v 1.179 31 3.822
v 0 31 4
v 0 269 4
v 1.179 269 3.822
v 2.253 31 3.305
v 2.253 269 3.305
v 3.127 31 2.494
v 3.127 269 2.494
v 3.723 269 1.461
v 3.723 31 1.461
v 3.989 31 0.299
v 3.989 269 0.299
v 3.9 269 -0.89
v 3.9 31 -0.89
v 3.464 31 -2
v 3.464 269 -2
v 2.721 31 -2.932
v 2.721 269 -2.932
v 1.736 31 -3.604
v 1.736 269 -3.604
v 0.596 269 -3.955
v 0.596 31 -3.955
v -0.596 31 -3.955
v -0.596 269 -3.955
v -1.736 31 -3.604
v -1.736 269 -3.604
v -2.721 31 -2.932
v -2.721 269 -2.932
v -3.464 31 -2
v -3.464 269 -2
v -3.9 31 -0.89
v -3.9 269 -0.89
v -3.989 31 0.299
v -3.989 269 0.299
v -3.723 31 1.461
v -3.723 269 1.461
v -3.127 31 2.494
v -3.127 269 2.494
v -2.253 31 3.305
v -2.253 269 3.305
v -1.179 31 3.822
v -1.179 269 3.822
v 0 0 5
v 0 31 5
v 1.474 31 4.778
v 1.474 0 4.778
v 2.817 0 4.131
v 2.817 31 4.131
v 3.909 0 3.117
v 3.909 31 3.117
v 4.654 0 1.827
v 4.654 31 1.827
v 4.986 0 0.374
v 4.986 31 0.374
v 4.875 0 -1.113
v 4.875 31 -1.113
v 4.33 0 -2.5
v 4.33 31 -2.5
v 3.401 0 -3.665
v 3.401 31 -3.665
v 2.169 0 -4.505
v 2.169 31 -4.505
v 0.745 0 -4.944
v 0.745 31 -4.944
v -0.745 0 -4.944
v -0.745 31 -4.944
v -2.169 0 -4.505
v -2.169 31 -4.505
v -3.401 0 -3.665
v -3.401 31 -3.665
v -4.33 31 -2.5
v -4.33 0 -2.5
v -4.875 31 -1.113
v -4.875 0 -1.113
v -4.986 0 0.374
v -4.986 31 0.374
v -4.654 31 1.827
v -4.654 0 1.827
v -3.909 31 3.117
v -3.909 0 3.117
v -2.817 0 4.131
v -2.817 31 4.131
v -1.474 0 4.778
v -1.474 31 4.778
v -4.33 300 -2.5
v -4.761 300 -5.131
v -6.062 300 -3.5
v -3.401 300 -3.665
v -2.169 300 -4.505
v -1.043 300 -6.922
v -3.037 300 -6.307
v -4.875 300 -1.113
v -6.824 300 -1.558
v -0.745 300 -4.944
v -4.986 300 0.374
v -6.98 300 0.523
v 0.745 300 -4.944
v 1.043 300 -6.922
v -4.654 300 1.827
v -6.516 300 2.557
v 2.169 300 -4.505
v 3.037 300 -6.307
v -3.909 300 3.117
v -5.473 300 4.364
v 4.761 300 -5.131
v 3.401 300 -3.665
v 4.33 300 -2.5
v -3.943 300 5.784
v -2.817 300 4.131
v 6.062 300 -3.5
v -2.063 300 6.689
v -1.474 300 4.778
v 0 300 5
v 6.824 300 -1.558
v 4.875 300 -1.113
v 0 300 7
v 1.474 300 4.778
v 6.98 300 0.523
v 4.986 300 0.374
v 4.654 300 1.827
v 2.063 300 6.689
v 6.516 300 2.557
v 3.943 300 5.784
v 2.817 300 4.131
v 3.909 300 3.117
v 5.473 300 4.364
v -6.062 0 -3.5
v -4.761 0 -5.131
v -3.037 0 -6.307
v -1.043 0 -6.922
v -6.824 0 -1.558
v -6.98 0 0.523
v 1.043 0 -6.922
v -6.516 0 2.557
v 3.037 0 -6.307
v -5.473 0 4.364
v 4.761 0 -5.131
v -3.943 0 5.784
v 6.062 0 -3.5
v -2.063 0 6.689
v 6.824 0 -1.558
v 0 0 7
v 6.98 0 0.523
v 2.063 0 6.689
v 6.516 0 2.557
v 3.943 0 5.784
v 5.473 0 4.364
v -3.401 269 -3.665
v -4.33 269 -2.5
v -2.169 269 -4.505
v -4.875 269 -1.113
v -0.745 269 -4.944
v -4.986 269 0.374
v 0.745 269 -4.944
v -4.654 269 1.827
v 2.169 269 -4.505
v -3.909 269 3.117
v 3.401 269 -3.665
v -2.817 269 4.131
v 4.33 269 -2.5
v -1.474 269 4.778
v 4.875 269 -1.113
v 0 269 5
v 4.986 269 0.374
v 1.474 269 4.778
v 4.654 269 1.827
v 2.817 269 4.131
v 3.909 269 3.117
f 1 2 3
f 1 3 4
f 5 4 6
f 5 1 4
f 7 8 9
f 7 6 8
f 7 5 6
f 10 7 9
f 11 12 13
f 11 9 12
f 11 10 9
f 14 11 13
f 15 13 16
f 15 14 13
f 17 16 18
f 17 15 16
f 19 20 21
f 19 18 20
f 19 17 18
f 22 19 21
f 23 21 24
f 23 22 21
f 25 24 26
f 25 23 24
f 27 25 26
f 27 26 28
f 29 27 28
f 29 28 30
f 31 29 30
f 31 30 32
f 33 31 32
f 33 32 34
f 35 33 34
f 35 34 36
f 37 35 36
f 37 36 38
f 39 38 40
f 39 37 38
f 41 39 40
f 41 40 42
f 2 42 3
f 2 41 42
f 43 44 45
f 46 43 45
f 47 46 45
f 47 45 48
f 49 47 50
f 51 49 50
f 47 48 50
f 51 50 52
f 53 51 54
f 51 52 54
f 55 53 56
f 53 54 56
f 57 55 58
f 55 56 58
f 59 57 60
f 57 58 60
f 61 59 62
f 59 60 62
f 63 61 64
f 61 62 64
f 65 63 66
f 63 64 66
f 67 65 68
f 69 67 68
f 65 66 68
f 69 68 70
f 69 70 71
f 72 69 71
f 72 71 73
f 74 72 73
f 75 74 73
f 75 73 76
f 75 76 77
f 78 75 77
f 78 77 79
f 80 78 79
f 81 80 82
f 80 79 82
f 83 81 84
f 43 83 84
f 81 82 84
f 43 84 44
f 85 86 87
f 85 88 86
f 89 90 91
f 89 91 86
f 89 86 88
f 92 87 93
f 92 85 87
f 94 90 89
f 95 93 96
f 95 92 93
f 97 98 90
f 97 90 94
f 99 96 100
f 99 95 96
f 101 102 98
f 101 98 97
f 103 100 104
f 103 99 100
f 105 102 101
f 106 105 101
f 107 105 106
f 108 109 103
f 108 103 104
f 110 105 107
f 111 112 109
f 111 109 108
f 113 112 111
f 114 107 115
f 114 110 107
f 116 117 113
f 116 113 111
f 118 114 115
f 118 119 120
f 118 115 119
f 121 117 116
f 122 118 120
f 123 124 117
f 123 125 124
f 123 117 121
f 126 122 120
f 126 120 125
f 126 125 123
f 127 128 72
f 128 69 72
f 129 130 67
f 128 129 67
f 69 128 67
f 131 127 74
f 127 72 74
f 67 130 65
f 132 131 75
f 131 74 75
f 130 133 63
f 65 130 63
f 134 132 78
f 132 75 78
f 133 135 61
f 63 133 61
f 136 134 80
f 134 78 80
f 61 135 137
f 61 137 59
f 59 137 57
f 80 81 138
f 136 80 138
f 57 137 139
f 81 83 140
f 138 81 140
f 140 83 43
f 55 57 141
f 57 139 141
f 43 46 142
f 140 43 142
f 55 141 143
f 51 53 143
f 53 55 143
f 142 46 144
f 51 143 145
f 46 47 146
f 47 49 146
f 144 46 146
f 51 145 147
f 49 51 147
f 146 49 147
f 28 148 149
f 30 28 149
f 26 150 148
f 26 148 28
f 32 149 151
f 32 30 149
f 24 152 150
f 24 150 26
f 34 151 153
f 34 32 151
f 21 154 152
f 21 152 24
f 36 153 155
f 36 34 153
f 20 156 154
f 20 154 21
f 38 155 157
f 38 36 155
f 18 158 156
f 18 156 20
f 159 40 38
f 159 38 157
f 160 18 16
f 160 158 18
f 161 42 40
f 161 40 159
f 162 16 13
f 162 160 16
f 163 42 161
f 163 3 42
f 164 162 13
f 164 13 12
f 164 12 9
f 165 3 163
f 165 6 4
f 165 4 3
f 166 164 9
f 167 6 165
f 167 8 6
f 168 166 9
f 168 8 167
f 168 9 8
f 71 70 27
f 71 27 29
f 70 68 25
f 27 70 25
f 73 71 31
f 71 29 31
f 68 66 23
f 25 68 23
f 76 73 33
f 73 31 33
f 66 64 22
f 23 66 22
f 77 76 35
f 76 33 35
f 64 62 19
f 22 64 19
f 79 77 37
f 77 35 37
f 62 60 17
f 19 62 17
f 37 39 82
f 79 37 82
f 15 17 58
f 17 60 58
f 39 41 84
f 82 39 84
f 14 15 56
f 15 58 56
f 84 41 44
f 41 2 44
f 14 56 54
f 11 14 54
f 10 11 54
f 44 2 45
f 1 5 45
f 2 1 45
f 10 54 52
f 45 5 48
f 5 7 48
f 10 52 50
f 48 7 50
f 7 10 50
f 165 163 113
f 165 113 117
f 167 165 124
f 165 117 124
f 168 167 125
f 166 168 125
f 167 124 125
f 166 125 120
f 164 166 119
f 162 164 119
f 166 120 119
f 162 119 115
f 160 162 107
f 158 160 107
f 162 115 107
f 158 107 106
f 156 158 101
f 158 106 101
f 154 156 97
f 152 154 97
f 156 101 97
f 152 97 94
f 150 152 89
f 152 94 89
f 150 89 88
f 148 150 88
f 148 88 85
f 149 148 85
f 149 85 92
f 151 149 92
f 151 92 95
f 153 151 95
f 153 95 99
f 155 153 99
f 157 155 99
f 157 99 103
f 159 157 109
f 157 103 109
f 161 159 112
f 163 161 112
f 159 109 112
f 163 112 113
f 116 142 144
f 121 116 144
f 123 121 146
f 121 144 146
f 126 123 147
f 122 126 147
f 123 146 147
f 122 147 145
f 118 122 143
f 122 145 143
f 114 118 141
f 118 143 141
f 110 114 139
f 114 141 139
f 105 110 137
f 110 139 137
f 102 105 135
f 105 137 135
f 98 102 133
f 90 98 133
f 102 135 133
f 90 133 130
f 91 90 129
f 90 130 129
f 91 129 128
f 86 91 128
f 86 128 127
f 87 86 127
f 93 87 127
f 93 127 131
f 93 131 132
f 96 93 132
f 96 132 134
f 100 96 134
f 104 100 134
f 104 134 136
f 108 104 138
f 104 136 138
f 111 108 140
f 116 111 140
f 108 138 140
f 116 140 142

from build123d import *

# Parameters (mm, degrees)
SKETCH1_R           = 7
SKETCH1_R_2         = 4
BOSS_EXTRUDE1_DEPTH = 300
SKETCH2_R           = 5
CUT_EXTRUDE1_DEPTH  = 31
CUT_EXTRUDE2_START  = -269
SKETCH2_2_R         = 5
CUT_EXTRUDE2_DEPTH  = 31


with BuildPart() as part:
    # Sketch1 → Boss-Extrude1 (new body)
    with BuildSketch(Plane(origin=(0, 0, 0), x_dir=(1, 0, 0), z_dir=(0, 1, 0))):
        with Locations(Location((0, 0, 0), (0, 0, 270))):
            Circle(SKETCH1_R)
        with Locations(Location((0, 0, 0), (0, 0, 270))):
            Circle(SKETCH1_R_2, mode=Mode.SUBTRACT)
    extrude(amount=BOSS_EXTRUDE1_DEPTH)

    # Sketch2 → Cut-Extrude1 (cut)
    with BuildSketch(Plane(origin=(0, 300, 0), x_dir=(1, 0, 0), z_dir=(0, 1, 0))):
        with Locations(Location((0, 0, 0), (0, 0, 270))):
            Circle(SKETCH2_R)
    extrude(amount=-CUT_EXTRUDE1_DEPTH, mode=Mode.SUBTRACT)

    # Sketch2<2> → Cut-Extrude2 (cut)
    with BuildSketch(Plane(origin=(0, 300, 0), x_dir=(1, 0, 0), z_dir=(0, 1, 0)).offset(CUT_EXTRUDE2_START)):
        with Locations(Location((0, 0, 0), (0, 0, 270))):
            Circle(SKETCH2_2_R)
    extrude(amount=-CUT_EXTRUDE2_DEPTH, mode=Mode.SUBTRACT)


solid = part.part
